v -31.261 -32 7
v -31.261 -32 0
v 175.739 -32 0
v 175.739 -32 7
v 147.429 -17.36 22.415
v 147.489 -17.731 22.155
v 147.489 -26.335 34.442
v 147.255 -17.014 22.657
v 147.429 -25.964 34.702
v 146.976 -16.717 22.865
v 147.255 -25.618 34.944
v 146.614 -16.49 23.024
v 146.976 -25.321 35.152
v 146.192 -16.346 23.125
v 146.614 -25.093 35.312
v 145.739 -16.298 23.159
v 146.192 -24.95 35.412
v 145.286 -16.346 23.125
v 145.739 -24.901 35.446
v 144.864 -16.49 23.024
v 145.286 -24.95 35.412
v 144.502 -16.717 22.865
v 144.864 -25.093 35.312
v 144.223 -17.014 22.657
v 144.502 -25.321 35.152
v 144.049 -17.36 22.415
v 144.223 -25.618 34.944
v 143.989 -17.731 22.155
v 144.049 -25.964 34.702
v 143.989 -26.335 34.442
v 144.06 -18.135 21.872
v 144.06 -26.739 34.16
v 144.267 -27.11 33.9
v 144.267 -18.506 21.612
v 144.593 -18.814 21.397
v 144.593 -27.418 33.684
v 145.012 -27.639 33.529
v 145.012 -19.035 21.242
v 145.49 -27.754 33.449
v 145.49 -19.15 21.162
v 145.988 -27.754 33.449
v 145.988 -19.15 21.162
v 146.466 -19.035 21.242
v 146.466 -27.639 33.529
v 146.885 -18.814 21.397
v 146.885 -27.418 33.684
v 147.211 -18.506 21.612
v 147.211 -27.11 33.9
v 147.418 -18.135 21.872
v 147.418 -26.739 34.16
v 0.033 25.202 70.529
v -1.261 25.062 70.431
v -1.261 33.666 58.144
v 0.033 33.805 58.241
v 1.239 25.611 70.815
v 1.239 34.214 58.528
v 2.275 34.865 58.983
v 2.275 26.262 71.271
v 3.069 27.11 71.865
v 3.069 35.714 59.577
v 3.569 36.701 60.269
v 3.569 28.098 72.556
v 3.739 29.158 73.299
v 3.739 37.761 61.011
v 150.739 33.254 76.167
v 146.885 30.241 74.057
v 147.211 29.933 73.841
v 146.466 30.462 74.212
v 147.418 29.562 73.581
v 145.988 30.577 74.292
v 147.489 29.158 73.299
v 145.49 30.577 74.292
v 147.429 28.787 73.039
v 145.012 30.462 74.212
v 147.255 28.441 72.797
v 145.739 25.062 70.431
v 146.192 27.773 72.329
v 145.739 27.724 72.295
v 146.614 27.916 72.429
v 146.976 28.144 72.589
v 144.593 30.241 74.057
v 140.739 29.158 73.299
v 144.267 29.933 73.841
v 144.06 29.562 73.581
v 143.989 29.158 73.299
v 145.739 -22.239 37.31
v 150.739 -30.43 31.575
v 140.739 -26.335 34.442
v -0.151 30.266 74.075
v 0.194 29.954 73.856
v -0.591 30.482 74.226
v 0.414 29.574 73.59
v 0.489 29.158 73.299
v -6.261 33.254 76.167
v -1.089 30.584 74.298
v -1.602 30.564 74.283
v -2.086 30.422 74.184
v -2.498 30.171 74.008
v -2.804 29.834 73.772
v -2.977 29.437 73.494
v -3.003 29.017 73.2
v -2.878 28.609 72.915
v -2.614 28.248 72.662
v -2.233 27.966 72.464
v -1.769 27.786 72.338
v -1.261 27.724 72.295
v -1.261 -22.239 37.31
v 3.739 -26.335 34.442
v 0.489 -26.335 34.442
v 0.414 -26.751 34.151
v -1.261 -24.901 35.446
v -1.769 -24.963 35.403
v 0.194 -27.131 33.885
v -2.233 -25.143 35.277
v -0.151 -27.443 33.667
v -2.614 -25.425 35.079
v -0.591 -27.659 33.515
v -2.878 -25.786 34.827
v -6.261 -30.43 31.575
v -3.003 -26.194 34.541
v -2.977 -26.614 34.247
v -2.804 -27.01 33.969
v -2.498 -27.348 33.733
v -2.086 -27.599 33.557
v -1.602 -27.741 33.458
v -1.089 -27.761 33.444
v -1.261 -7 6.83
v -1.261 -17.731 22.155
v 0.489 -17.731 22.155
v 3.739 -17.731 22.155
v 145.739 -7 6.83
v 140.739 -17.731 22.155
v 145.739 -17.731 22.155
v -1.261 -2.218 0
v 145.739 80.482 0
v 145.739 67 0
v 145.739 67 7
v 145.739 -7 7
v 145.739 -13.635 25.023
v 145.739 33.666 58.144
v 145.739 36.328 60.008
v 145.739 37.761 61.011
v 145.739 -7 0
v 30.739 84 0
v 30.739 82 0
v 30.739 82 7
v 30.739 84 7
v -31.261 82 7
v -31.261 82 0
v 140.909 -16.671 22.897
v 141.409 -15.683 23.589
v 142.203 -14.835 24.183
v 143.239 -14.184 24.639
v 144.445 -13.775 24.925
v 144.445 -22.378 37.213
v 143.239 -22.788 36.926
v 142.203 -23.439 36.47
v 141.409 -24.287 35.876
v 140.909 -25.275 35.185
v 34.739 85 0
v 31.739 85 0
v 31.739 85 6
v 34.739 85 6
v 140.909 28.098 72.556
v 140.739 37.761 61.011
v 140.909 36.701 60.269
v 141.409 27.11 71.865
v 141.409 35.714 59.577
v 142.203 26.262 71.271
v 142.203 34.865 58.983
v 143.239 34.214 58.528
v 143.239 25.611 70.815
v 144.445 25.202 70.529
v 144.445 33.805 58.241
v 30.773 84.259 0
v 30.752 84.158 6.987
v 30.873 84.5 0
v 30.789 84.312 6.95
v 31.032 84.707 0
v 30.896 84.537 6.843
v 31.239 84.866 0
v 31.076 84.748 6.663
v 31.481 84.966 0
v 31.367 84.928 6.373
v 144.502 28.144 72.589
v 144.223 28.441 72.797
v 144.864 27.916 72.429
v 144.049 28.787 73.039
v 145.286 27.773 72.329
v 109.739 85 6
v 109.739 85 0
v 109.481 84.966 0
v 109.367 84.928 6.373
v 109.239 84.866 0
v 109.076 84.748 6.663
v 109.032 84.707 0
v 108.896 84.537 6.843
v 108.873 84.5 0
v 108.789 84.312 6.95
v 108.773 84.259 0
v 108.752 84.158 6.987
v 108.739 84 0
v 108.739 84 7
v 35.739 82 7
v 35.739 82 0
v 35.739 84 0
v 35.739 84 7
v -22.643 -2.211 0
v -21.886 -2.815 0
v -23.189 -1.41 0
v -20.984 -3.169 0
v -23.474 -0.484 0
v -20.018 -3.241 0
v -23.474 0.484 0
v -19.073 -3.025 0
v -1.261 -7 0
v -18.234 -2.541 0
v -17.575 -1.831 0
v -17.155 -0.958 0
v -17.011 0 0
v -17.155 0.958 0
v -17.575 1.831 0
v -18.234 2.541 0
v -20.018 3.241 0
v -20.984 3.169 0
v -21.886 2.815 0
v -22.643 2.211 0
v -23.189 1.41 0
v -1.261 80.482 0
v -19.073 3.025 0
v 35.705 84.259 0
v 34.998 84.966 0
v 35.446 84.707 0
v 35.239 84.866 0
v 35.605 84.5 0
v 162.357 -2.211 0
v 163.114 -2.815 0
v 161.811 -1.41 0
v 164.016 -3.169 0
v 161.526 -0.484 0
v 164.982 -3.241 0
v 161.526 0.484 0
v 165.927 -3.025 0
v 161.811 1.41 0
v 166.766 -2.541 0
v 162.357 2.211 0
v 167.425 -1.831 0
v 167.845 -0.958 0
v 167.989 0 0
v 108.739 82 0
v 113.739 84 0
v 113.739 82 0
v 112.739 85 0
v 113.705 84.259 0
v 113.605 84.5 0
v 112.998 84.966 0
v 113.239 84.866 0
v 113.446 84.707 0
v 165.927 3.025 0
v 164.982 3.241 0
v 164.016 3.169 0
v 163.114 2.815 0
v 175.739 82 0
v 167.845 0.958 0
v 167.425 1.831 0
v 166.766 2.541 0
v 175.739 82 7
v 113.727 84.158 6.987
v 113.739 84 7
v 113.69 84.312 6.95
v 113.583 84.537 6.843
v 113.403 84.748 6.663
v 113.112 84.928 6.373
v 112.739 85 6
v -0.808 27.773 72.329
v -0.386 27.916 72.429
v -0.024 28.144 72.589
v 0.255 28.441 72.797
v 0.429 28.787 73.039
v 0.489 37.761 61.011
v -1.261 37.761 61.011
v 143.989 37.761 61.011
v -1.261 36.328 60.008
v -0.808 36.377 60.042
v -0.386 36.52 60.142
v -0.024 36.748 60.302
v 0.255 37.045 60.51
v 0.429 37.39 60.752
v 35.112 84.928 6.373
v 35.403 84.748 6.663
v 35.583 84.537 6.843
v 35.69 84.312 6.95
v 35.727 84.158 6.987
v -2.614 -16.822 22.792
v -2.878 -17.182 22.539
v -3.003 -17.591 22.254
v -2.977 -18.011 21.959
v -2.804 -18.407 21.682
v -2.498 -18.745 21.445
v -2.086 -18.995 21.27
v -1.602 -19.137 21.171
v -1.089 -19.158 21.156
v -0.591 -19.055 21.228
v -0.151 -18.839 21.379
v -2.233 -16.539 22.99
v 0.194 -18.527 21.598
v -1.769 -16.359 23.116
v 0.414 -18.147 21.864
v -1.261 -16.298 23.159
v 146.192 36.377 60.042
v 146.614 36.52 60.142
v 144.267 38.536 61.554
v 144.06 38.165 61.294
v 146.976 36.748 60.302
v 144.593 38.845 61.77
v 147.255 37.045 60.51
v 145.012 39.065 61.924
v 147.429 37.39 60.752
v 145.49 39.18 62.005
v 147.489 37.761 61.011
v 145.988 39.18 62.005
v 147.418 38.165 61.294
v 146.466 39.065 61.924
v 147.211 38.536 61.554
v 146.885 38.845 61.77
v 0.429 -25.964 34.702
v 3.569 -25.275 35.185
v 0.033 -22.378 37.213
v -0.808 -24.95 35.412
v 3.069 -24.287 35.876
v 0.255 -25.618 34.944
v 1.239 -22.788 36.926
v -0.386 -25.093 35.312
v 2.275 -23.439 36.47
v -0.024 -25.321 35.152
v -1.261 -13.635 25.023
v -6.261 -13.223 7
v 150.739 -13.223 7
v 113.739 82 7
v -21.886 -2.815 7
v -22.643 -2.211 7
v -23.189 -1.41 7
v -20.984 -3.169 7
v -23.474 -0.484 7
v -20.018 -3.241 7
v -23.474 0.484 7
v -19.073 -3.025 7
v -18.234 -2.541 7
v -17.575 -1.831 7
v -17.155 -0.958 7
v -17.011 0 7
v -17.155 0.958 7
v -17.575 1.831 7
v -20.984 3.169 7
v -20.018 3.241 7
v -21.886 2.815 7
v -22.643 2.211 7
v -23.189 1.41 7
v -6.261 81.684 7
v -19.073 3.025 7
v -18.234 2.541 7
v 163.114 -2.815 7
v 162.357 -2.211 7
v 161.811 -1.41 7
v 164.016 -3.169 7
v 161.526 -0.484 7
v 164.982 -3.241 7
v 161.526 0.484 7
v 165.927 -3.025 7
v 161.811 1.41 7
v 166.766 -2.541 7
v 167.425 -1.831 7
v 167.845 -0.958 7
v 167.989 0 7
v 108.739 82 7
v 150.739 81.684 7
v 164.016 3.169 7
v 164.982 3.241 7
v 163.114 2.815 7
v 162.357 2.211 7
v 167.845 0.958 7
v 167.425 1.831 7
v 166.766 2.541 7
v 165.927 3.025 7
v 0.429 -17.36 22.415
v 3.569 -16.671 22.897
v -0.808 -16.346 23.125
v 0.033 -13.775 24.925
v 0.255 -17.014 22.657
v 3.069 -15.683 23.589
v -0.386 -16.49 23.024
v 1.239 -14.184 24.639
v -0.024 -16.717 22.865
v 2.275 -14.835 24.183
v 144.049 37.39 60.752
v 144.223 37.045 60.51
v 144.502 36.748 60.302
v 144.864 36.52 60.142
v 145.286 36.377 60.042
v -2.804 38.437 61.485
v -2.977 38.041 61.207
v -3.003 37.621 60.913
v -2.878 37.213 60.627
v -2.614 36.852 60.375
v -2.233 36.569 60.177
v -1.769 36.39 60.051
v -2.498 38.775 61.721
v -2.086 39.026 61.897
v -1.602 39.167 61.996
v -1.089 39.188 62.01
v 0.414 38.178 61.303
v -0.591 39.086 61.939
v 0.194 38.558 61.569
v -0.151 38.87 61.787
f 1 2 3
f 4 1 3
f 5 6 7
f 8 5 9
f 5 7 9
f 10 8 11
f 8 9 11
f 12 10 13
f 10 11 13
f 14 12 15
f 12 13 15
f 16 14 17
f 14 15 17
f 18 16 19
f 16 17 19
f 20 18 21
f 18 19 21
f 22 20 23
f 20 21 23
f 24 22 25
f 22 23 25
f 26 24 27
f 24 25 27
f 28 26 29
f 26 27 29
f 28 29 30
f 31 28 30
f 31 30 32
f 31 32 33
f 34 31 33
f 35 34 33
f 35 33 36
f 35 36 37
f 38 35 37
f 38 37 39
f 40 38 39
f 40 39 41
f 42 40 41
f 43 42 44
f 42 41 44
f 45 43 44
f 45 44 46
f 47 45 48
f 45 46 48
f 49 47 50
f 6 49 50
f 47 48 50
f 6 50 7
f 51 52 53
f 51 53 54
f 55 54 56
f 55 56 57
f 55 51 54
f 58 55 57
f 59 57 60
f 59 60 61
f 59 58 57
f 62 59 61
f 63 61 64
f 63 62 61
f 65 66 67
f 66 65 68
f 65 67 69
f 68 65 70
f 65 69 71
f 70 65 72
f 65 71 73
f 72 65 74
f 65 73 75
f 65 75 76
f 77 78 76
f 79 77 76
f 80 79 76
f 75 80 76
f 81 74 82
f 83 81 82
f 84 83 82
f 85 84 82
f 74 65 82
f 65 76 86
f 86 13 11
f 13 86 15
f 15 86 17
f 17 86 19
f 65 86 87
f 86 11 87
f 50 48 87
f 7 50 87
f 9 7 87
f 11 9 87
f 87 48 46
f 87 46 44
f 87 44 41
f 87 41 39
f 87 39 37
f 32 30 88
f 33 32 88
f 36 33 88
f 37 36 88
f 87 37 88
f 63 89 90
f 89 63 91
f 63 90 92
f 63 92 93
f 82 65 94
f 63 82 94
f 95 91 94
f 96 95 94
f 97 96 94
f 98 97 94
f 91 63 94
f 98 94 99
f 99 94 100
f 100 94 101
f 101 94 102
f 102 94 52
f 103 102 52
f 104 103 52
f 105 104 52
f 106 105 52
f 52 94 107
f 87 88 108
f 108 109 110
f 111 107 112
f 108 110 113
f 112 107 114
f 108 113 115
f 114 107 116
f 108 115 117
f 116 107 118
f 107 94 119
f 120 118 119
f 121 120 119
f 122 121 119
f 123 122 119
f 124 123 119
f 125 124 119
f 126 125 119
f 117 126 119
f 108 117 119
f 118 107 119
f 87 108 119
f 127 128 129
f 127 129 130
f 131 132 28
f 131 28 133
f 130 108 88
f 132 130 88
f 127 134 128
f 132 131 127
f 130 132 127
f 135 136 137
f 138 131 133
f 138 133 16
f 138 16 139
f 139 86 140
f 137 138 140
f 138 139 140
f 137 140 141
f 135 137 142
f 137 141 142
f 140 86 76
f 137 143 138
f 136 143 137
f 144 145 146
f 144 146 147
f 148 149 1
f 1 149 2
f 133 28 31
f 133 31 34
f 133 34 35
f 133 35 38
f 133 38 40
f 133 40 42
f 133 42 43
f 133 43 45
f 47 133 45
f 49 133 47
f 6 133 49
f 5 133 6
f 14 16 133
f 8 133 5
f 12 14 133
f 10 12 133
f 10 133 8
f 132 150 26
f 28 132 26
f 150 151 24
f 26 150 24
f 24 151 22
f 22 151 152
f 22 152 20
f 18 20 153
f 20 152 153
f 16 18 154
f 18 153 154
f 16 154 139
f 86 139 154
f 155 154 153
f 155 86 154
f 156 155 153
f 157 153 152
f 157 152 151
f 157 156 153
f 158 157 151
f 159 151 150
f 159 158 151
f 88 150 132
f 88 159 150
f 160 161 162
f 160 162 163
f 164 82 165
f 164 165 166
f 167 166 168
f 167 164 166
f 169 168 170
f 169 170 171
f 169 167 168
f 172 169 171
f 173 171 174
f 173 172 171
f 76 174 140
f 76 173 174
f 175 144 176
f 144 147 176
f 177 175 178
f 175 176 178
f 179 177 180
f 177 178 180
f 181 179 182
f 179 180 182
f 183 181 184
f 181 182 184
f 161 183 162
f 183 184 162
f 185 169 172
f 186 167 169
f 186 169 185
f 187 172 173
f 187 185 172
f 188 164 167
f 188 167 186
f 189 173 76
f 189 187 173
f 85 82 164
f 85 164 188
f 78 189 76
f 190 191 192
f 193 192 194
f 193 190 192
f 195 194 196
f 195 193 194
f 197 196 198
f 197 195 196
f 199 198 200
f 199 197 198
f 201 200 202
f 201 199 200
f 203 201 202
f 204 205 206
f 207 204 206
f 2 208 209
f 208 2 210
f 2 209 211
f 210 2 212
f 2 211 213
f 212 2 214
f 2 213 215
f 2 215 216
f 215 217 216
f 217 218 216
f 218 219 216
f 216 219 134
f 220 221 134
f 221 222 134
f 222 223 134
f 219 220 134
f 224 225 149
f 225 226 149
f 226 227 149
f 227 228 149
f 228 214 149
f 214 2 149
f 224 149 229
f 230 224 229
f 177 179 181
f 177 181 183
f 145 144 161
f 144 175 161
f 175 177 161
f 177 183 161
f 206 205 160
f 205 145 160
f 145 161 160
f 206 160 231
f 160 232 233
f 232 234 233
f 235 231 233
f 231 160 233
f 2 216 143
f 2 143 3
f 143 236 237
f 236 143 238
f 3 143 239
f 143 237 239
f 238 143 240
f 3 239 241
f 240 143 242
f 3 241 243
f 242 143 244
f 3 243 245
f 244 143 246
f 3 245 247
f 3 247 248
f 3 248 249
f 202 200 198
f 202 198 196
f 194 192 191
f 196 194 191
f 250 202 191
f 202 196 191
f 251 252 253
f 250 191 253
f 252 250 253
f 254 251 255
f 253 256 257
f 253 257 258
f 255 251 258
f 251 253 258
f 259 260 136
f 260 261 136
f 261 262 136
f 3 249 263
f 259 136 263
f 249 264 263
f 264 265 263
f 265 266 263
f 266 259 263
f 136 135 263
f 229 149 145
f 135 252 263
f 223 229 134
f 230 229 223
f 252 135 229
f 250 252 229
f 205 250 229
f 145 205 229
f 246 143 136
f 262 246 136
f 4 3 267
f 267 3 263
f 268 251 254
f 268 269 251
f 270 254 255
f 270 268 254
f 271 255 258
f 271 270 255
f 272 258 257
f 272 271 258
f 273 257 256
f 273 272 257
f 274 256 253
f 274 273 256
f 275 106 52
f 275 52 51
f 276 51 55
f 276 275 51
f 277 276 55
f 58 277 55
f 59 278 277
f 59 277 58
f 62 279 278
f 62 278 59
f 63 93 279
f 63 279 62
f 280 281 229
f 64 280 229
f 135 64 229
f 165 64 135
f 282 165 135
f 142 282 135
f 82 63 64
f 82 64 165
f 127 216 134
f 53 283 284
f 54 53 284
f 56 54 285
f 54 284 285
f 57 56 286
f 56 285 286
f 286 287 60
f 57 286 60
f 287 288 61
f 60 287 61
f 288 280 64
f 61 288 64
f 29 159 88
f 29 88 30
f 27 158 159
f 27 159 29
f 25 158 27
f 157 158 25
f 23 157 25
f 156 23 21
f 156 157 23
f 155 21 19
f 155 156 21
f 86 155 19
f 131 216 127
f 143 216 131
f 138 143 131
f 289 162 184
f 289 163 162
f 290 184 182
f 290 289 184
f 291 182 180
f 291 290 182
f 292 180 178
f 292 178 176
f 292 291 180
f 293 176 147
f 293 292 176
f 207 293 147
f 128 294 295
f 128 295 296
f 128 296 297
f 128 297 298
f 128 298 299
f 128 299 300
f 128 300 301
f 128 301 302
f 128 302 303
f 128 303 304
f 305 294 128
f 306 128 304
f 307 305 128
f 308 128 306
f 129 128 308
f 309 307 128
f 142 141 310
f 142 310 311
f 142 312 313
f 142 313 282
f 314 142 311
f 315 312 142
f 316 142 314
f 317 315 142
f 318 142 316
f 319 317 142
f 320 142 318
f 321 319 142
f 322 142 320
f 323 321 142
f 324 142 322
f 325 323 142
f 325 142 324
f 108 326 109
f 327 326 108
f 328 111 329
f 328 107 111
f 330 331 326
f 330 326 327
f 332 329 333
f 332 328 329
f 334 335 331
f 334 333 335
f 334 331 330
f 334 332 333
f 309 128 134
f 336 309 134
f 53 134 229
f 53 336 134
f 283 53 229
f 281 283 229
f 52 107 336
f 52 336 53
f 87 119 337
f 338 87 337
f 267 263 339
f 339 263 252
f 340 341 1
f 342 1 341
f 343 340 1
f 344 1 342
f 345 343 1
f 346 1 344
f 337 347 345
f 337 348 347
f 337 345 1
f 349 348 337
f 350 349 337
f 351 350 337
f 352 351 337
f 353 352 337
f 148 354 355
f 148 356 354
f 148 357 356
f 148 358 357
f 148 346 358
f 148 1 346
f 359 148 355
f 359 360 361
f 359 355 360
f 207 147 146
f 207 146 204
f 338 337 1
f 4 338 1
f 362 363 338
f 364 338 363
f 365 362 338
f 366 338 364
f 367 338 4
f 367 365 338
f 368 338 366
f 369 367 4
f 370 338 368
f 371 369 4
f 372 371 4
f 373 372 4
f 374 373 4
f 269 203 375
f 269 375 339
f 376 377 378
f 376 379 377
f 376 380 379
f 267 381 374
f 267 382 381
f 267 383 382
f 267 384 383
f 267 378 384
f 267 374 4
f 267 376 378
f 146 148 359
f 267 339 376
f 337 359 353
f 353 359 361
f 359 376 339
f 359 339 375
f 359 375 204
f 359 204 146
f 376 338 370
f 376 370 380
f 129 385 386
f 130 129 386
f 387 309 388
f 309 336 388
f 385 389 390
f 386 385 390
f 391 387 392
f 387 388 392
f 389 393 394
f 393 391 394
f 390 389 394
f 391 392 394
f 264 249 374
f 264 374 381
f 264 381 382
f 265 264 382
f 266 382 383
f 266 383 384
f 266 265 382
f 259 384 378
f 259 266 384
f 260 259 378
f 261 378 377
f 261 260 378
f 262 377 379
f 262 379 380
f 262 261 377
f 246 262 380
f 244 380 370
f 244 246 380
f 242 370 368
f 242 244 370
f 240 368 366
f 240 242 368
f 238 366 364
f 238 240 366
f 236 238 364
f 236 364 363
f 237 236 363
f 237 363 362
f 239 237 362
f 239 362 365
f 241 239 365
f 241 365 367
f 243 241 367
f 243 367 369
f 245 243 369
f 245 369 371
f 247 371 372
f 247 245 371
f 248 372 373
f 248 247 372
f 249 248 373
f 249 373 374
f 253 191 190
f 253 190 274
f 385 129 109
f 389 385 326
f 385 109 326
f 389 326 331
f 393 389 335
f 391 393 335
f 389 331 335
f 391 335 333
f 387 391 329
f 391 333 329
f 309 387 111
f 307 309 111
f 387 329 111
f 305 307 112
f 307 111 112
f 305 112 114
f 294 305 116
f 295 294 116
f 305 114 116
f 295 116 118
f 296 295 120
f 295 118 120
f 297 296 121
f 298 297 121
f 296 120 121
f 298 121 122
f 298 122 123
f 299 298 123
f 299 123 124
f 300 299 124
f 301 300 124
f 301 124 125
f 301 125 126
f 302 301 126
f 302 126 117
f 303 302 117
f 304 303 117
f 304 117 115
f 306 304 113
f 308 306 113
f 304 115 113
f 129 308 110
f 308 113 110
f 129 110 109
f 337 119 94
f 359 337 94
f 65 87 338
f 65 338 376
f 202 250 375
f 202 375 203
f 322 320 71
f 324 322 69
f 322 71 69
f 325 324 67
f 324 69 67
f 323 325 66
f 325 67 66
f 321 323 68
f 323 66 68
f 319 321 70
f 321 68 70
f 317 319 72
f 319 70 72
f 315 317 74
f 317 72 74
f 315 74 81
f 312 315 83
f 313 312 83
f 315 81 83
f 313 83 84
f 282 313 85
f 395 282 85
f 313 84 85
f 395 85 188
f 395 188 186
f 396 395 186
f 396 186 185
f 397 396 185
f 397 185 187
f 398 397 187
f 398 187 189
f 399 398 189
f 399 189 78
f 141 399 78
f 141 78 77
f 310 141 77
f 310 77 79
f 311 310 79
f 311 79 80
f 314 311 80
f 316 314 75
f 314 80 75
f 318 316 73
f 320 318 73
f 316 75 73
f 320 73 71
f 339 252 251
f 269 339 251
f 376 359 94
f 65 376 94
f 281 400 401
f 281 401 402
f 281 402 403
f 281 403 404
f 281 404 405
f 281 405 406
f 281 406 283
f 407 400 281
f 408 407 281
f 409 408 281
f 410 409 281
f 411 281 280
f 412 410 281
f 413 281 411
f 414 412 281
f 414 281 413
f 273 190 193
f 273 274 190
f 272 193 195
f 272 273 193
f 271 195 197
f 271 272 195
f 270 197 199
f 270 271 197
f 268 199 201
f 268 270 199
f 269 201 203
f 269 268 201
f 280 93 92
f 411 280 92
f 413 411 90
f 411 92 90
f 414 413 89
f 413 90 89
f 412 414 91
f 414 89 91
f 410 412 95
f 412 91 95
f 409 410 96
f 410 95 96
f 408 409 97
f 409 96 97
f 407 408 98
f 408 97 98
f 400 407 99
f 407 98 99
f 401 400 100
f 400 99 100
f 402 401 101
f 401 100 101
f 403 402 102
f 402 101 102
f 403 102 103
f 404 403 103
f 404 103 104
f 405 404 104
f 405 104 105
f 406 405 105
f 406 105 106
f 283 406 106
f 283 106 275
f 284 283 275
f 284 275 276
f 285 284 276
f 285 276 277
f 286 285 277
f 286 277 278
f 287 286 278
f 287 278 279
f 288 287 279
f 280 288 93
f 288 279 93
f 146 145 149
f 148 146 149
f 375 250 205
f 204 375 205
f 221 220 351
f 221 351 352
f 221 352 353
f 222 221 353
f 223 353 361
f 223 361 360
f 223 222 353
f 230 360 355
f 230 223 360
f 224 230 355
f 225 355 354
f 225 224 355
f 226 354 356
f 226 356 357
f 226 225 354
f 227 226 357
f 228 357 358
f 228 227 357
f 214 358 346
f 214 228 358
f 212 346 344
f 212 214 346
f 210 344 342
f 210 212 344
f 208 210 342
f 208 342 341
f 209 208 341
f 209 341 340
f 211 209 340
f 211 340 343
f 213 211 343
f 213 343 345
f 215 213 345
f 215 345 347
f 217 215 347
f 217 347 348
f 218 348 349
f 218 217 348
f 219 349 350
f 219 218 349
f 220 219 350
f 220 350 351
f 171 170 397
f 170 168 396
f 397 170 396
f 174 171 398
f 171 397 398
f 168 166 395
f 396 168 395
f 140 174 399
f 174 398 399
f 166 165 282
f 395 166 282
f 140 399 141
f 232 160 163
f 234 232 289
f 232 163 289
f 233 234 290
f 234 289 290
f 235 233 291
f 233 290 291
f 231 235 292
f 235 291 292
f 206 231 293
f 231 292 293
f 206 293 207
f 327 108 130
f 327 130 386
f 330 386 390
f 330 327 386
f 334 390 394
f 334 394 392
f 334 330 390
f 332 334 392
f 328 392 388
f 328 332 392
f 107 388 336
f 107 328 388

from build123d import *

# Parameters (mm, degrees)
F0_R          = 3.25
F0_W          = 147
F0_H          = 74
F0_W_2        = 5
F0_H_2        = 3
F1_DEPTH      = 7
F4_DEPTH      = 150.739
F4_DEPTH_BACK = 6.261
F5_W          = 147
F5_H          = 67.7437671193
F6_DEPTH      = 156.2
F7_R          = 1
F9_DEPTH      = 15
F10_R         = 1.75
F11_DEPTH     = 15


# Not quite as in the source:
# - a feature names something its author has since deleted; it is built from what else it names


with BuildPart() as f1:
    # F0 (on Top) → F1 (new body)
    with BuildSketch(Plane.XY):
        Polygon((30.7393903136, 82), (-31.2606096864, 82), (-31.2606096864, -32), (175.7393903136, -32), (175.7393903136, 82), (113.7393903136, 82), (108.7393903136, 82), (35.7393903136, 82), align=None)
        with Locations((-20.2606096864, 0)):
            Circle(F0_R, mode=Mode.SUBTRACT)
        with Locations((164.7393903136, 0)):
            Circle(F0_R, mode=Mode.SUBTRACT)
        with Locations((72.2393903136, 30)):
            Rectangle(F0_W, F0_H, mode=Mode.SUBTRACT)
        with Locations((33.2393903136, 83.5)):
            Rectangle(F0_W_2, F0_H_2)
        with Locations((111.2393903136, 83.5)):
            Rectangle(F0_W_2, F0_H_2)
    extrude(amount=F1_DEPTH)

    # F3 (on Right) → F4 (join, two sides)
    with BuildSketch(Plane.YZ) as f4_sk:
        Polygon((-13.2231451571, 7), (81.6844701767, 7), (33.2535275188, 76.1665542214), (-30.4304382476, 31.5745613287), align=None)
    extrude(amount=F4_DEPTH)
    extrude(f4_sk.sketch, amount=-F4_DEPTH_BACK)

    # F5 (on face) → F6 (cut)
    with BuildSketch(Plane(origin=(0, -24.8464988409, 35.4844777942), x_dir=(1, 0, 0), z_dir=(0, -0.5735764364, 0.8191520443))):
        with Locations((72.239, 32.0551522267)):
            Rectangle(F5_W, F5_H)
    extrude(amount=-F6_DEPTH, mode=Mode.SUBTRACT)

    # F7
    f7_edges = [f1.edges().sort_by_distance(p)[0] for p in [
        (111.23939, 85, 7),
        (33.23939, 85, 7),
        (35.73939, 85, 3.5),
        (30.73939, 85, 3.5),
        (108.73939, 85, 3.5),
        (113.73939, 85, 3.5),
    ]]
    fillet(f7_edges, radius=F7_R)

    # F8 (on face) → F9 (join)
    with BuildSketch(Plane(origin=(0, -24.8464988409, 35.4844777942), x_dir=(1, 0, 0), z_dir=(0, -0.5735764364, 0.8191520443))):
        with BuildLine():
            Line((-1.261, 65.9270357864), (3.739, 65.9270357864))
            ThreePointArc((3.739, 65.9270357864), (2.2745339059, 69.4625696923), (-1.261, 70.9270357864))
            Line((-1.261, 70.9270357864), (-6.261, 70.9270357864))
            Line((-6.261, 70.9270357864), (-6.261, 65.9270357864))
            ThreePointArc((-6.261, 65.9270357864), (-4.7965339059, 62.3915018804), (-1.261, 60.9270357864))
            Line((-1.261, 60.9270357864), (-1.261, 65.9270357864))
        make_face()
        with BuildLine():
            ThreePointArc((-1.261, 60.9270357864), (2.2745339059, 62.3915018804), (3.739, 65.9270357864))
            Line((3.739, 65.9270357864), (-1.261, 65.9270357864))
            Line((-1.261, 65.9270357864), (-1.261, 60.9270357864))
        make_face()
        with BuildLine():
            Line((145.739, -1.8167313329), (145.739, 3.1832686671))
            ThreePointArc((145.739, 3.1832686671), (142.2034660941, 1.718802573), (140.739, -1.8167313329))
            Line((140.739, -1.8167313329), (145.739, -1.8167313329))
        make_face()
        with BuildLine():
            ThreePointArc((140.739, 65.9270357864), (142.2034660941, 62.3915018804), (145.739, 60.9270357864))
            Line((145.739, 60.9270357864), (145.739, 65.9270357864))
            Line((145.739, 65.9270357864), (140.739, 65.9270357864))
        make_face()
        with BuildLine():
            Line((150.739, -6.8167313329), (150.739, -1.8167313329))
            ThreePointArc((150.739, -1.8167313329), (149.2745339059, 1.718802573), (145.739, 3.1832686671))
            Line((145.739, 3.1832686671), (145.739, -1.8167313329))
            Line((145.739, -1.8167313329), (140.739, -1.8167313329))
            ThreePointArc((140.739, -1.8167313329), (142.2034660941, -5.3522652388), (145.739, -6.8167313329))
            Line((145.739, -6.8167313329), (150.739, -6.8167313329))
        make_face()
        with BuildLine():
            ThreePointArc((145.739, 60.9270357864), (149.2745339059, 62.3915018804), (150.739, 65.9270357864))
            Line((150.739, 65.9270357864), (150.739, 70.9270357864))
            Line((150.739, 70.9270357864), (145.739, 70.9270357864))
            ThreePointArc((145.739, 70.9270357864), (142.2034660941, 69.4625696923), (140.739, 65.9270357864))
            Line((140.739, 65.9270357864), (145.739, 65.9270357864))
            Line((145.739, 65.9270357864), (145.739, 60.9270357864))
        make_face()
        with BuildLine():
            Line((-1.261, -1.8167313329), (3.739, -1.8167313329))
            ThreePointArc((3.739, -1.8167313329), (2.2745339059, 1.718802573), (-1.261, 3.1832686671))
            Line((-1.261, 3.1832686671), (-1.261, -1.8167313329))
        make_face()
    extrude(amount=-F9_DEPTH)

    # F10 (on face) → F11 (cut)
    with BuildSketch(Plane(origin=(0, -24.8464988409, 35.4844777942), x_dir=(1, 0, 0), z_dir=(0, -0.5735764364, 0.8191520443))):
        with Locations((145.739, -1.8167313329)):
            Circle(F10_R)
        with Locations((145.739, 65.9270357864)):
            Circle(F10_R)
        with Locations((-1.261, 65.9270357864)):
            Circle(F10_R)
        with Locations((-1.261, -1.8167313329)):
            Circle(F10_R)
    extrude(amount=-F11_DEPTH, mode=Mode.SUBTRACT)


solid = f1.part
